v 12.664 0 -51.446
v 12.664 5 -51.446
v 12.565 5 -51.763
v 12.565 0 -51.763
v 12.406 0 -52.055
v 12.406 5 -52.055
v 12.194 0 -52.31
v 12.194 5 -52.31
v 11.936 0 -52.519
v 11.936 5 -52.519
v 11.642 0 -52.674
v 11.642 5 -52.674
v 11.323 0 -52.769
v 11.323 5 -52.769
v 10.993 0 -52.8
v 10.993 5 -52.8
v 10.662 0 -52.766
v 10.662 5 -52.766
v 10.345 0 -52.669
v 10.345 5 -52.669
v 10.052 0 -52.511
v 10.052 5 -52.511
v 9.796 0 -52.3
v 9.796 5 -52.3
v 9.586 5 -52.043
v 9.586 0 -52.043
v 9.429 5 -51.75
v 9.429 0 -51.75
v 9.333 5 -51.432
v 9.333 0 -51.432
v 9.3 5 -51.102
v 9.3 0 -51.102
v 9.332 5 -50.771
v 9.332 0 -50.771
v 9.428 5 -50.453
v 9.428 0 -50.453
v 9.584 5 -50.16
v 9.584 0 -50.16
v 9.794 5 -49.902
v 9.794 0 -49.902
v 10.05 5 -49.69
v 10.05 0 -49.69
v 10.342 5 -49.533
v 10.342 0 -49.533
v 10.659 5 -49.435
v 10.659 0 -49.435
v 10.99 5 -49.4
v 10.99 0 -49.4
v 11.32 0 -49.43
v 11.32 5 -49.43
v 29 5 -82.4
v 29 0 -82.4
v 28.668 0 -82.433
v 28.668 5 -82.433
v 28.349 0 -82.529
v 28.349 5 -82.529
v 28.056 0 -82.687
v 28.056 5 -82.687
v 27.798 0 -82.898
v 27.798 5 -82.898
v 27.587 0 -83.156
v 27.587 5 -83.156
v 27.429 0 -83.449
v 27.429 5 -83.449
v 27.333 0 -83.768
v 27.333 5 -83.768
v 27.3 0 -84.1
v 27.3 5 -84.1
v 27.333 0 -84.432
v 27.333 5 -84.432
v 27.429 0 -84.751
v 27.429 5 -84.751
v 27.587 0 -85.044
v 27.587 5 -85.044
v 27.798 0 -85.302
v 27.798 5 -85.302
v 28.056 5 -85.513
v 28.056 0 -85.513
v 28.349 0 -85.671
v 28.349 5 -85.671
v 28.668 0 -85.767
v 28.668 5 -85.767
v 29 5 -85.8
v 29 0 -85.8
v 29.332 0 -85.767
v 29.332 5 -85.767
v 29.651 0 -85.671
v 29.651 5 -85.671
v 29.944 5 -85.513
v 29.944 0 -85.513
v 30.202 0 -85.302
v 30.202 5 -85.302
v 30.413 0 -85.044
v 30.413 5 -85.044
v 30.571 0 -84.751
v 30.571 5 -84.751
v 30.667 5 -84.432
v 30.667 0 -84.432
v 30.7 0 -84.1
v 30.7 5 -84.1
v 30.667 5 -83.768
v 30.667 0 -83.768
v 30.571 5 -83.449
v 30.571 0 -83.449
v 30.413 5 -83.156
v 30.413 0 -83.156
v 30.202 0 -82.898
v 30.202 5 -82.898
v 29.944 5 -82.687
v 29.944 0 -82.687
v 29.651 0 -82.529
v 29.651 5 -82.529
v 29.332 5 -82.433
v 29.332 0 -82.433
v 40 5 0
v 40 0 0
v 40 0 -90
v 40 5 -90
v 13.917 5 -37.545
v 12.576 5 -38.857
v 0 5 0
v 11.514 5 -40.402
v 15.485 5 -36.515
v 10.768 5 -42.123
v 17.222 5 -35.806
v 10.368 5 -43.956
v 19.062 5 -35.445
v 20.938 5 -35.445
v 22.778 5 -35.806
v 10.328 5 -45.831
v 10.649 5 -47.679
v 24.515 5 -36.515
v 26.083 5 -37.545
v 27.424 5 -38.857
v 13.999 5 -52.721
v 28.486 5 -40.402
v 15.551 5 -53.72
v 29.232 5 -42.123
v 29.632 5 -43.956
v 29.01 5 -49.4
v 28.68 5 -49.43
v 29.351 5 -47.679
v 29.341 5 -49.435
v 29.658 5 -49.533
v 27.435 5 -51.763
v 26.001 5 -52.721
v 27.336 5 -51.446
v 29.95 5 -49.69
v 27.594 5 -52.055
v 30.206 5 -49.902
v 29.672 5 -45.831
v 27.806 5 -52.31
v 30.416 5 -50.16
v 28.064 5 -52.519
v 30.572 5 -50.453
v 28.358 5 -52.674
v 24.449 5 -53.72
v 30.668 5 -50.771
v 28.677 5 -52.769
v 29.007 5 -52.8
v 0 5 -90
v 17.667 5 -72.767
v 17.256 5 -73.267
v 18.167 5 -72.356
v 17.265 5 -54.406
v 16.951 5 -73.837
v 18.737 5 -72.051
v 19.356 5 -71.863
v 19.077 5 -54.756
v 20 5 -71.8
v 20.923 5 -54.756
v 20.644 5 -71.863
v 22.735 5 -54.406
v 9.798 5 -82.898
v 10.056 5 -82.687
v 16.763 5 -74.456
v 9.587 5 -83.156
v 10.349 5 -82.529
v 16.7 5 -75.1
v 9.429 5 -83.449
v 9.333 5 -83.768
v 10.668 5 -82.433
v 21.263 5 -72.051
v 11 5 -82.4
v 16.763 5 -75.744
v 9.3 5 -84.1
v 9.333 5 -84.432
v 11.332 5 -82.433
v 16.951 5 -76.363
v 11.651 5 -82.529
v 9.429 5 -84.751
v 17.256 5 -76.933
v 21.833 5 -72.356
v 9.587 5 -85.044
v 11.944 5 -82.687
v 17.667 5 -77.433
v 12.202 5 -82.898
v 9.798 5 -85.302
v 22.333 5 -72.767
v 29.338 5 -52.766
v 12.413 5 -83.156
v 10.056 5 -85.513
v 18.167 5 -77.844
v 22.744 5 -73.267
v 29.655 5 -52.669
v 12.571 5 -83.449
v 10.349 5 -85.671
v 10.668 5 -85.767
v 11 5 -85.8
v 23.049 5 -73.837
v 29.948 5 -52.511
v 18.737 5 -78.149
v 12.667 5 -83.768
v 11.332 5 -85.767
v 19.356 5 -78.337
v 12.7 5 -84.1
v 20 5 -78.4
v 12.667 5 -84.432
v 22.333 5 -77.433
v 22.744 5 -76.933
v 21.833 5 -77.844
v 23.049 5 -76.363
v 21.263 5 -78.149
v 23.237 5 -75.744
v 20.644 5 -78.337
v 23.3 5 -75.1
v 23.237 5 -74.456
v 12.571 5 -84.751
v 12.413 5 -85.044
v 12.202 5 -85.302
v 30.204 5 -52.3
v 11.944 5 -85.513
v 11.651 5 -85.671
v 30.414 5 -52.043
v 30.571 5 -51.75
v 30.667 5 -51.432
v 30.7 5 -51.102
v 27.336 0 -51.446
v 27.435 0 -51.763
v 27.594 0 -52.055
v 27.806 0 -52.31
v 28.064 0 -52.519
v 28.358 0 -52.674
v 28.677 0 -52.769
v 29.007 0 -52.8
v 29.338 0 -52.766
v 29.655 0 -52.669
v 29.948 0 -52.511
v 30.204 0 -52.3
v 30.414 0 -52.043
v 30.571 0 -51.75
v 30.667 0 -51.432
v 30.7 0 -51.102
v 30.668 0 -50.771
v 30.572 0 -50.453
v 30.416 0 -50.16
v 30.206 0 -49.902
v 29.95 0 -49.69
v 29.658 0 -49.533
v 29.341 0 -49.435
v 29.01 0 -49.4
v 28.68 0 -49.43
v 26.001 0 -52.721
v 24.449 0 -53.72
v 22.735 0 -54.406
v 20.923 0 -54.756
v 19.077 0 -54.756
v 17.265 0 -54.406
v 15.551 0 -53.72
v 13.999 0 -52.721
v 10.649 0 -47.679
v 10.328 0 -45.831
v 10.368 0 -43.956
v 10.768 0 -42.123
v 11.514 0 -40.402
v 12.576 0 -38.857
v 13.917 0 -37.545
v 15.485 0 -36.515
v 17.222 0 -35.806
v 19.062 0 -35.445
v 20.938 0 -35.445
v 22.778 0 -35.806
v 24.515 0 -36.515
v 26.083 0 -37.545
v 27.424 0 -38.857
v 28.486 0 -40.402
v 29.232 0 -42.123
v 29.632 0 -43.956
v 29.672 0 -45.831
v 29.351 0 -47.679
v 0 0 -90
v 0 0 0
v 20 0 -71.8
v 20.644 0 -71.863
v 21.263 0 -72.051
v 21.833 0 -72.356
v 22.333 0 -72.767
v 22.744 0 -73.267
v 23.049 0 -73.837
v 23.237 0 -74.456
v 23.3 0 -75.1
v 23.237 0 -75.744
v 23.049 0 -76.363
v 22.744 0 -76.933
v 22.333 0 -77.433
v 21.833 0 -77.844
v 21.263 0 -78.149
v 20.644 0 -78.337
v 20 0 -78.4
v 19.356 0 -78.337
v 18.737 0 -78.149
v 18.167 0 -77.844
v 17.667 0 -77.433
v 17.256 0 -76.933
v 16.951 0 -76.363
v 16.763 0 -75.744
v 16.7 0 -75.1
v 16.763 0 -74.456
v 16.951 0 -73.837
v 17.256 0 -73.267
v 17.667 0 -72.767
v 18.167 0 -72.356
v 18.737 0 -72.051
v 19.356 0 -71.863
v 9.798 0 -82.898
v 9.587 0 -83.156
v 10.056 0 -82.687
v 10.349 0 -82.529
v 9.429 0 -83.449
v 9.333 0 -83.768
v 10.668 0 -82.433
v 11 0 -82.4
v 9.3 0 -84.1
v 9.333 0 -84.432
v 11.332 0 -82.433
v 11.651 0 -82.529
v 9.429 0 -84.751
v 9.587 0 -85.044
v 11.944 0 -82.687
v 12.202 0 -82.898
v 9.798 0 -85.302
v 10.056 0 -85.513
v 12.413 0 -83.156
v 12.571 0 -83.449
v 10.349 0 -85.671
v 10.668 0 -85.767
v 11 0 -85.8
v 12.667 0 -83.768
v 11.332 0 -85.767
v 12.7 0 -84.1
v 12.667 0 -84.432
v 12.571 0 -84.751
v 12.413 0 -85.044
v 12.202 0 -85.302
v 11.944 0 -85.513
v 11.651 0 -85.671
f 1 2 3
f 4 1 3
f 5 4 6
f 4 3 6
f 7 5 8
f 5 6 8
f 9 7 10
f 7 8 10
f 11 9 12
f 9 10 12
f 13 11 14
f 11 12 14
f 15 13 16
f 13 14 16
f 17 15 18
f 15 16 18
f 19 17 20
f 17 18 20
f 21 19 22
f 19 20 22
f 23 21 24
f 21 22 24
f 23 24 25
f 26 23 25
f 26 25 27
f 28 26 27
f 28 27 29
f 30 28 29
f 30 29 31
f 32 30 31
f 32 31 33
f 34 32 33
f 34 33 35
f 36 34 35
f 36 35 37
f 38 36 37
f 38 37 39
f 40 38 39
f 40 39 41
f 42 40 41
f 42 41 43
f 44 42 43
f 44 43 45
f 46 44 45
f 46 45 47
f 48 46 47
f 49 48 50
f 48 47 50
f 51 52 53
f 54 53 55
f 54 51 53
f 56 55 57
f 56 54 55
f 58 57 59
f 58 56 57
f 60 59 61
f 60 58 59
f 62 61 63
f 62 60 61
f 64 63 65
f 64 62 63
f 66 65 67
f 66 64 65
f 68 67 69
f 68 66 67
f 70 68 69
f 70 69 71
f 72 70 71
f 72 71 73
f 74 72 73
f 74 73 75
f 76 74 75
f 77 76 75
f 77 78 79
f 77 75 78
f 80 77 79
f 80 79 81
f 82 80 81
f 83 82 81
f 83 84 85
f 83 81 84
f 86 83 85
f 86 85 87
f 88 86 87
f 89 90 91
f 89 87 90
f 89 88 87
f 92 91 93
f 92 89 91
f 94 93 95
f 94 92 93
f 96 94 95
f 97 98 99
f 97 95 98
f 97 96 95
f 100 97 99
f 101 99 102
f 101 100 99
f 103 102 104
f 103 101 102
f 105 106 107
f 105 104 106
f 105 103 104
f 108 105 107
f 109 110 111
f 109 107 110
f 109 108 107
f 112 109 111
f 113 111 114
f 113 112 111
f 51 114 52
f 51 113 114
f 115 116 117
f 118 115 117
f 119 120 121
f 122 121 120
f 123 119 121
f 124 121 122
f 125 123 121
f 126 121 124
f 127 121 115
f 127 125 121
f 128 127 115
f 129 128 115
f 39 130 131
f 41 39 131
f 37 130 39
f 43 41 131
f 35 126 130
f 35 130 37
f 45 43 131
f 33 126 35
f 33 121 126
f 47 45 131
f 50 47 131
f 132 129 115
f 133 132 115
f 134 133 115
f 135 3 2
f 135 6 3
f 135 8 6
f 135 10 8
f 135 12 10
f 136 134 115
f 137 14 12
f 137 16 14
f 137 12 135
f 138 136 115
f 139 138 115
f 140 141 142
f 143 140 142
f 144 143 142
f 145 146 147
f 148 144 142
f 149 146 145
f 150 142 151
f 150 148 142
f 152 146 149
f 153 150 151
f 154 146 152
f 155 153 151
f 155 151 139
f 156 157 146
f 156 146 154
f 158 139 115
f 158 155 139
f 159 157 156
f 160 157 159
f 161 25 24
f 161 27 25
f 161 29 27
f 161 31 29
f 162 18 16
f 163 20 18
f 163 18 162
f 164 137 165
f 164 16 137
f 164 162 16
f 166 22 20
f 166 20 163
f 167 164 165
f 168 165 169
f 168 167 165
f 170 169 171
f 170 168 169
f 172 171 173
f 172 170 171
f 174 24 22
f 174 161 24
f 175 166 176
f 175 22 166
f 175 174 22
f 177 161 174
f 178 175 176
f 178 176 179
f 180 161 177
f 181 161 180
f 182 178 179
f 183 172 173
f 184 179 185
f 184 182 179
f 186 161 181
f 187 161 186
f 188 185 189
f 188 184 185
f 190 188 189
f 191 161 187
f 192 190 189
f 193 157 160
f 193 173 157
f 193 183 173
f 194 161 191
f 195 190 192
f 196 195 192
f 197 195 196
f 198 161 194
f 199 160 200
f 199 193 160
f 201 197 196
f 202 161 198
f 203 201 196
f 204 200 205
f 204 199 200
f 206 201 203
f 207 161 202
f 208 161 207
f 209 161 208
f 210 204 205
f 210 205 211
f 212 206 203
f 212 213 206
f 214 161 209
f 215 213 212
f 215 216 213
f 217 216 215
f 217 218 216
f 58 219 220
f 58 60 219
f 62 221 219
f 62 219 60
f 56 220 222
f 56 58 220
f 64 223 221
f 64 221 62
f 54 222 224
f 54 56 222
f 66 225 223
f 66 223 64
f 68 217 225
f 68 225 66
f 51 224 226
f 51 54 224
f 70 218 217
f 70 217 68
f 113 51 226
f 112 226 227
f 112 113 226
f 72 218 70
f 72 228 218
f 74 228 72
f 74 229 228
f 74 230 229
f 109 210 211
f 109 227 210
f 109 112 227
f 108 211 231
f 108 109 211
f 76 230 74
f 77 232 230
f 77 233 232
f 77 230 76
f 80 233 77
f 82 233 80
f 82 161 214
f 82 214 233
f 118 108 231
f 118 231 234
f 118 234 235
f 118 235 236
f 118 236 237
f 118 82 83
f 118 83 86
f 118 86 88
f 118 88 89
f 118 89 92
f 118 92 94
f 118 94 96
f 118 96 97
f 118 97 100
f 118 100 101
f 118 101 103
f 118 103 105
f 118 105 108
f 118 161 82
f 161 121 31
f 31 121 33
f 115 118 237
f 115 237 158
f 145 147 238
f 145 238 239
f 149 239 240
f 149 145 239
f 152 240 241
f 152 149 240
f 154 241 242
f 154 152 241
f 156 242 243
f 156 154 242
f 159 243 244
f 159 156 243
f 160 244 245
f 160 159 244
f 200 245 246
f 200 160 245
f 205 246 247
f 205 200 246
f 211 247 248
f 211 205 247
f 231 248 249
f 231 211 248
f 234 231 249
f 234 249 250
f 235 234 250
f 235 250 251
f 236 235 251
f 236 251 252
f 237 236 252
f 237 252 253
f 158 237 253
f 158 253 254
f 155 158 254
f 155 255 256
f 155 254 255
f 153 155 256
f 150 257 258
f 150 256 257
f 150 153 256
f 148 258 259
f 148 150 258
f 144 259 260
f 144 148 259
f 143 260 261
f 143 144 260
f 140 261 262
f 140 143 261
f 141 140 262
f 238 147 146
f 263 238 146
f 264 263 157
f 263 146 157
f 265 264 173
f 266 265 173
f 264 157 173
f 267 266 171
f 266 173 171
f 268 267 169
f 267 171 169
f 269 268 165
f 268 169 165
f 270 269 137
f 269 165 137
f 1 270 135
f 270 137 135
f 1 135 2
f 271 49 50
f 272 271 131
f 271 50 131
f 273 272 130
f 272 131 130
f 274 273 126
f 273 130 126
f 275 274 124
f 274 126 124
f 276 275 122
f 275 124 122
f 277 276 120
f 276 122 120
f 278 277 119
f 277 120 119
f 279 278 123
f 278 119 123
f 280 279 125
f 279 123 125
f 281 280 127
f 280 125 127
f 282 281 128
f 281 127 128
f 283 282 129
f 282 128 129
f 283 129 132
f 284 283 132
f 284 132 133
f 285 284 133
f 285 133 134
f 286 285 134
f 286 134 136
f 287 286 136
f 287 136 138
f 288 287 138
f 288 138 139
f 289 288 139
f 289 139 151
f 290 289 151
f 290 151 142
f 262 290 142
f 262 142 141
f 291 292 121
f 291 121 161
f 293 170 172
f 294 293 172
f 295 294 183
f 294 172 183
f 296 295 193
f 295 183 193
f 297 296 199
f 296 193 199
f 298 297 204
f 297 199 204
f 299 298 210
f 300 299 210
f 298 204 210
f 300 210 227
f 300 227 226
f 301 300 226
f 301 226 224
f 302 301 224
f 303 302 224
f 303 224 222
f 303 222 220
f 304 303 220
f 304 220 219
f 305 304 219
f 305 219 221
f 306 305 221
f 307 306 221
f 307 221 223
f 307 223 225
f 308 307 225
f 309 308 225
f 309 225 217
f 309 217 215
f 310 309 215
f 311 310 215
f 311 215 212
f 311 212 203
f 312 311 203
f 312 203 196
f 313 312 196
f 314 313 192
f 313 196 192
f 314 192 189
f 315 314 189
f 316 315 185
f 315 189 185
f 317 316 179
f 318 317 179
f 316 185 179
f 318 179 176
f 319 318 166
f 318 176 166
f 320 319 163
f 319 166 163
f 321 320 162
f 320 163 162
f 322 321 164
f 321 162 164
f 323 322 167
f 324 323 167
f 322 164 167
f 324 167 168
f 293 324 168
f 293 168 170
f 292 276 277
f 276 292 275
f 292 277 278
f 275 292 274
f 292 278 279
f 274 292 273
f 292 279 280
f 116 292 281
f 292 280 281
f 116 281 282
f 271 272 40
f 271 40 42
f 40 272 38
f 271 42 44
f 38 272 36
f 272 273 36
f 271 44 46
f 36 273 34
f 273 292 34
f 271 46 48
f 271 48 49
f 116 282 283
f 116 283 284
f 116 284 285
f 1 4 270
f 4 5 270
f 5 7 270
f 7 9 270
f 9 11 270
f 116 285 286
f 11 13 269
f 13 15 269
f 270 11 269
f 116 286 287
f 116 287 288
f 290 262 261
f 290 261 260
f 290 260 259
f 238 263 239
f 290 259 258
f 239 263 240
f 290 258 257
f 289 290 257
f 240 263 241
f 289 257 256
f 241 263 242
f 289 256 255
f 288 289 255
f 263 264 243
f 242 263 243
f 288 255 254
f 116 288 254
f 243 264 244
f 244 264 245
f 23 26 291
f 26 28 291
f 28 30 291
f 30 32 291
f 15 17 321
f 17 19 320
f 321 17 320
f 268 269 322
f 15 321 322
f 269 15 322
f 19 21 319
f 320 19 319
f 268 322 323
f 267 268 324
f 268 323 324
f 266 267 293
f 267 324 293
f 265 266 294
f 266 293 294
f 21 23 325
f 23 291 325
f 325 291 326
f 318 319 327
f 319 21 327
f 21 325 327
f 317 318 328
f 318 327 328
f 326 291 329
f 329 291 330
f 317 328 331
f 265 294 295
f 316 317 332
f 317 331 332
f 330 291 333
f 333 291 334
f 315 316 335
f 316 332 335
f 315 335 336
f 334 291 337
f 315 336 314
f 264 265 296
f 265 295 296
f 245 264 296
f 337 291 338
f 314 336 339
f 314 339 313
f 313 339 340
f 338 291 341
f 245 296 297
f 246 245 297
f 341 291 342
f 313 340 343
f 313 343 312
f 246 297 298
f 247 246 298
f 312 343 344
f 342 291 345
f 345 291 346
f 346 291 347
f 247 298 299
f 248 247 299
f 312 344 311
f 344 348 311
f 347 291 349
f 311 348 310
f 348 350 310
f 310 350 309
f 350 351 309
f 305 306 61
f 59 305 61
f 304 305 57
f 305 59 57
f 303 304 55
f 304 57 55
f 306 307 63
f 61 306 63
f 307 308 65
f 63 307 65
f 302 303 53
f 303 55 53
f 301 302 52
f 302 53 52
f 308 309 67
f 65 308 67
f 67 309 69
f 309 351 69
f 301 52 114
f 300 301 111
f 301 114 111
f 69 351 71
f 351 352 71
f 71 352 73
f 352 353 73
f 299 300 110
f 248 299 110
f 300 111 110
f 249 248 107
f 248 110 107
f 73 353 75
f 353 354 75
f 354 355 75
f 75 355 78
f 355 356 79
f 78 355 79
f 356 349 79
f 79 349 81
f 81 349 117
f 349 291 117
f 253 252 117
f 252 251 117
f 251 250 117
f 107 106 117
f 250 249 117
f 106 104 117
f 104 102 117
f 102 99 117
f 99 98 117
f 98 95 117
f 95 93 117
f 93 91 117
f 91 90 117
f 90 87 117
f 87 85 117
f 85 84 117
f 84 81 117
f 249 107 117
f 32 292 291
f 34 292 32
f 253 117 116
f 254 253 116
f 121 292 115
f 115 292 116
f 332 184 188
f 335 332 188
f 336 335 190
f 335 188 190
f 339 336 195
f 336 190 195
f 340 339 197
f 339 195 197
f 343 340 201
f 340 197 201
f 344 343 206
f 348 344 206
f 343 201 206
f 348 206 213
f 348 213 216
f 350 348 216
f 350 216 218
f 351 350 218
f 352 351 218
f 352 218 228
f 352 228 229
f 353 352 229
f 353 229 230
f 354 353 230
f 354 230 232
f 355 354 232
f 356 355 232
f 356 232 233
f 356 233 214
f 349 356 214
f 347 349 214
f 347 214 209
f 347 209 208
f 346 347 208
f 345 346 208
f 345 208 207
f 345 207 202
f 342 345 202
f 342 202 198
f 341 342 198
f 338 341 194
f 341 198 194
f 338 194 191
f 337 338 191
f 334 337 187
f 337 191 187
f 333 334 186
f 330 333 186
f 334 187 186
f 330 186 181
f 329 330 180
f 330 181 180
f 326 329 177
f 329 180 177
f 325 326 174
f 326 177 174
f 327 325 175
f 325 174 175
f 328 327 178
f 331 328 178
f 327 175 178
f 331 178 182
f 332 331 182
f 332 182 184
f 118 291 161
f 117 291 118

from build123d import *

# Parameters (mm, degrees)
SKETCH2_W           = 40
SKETCH2_H           = 90
BOSS_EXTRUDE1_DEPTH = 5
SKETCH3_R           = 3.3
SKETCH3_R_2         = 9.7
CUT_EXTRUDE1_DEPTH  = 99.615414617
SKETCH5_R           = 1.7
CUT_EXTRUDE2_DEPTH  = 99.615414617


with BuildPart() as part:
    # Sketch2 → Boss-Extrude1 (new body)
    with BuildSketch(Plane(origin=(0, 0, 0), x_dir=(1, 0, 0), z_dir=(0, 1, 0))):
        with Locations((20, 45)):
            Rectangle(SKETCH2_W, SKETCH2_H)
    extrude(amount=BOSS_EXTRUDE1_DEPTH)

    # Sketch3 → Cut-Extrude1 (cut, through all)
    with BuildSketch(Plane(origin=(0, 5, 0), x_dir=(1, 0, 0), z_dir=(0, 1, 0))):
        with Locations(Location((20, 75.1, 0), (0, 0, 270))):
            Circle(SKETCH3_R)
        with Locations(Location((20, 45.1, 0), (0, 0, 270))):
            Circle(SKETCH3_R_2)
    extrude(amount=-CUT_EXTRUDE1_DEPTH, mode=Mode.SUBTRACT)

    # Sketch5 → Cut-Extrude2 (cut, through all)
    with BuildSketch(Plane(origin=(0, 5, 0), x_dir=(1, 0, 0), z_dir=(0, 1, 0))):
        with Locations(Location((11, 84.1, 0), (0, 0, 270))):
            Circle(SKETCH5_R)
        with Locations((11, 51.1)):
            Circle(SKETCH5_R)
    cut_extrude2 = extrude(amount=-CUT_EXTRUDE2_DEPTH, mode=Mode.SUBTRACT)

    # Mirror1: Cut-Extrude2 across plane
    add(cut_extrude2.mirror(Plane(origin=(20, 0, 0), x_dir=(0, 0, 1), z_dir=(1, 0, 0))), mode=Mode.SUBTRACT)


solid = part.part
